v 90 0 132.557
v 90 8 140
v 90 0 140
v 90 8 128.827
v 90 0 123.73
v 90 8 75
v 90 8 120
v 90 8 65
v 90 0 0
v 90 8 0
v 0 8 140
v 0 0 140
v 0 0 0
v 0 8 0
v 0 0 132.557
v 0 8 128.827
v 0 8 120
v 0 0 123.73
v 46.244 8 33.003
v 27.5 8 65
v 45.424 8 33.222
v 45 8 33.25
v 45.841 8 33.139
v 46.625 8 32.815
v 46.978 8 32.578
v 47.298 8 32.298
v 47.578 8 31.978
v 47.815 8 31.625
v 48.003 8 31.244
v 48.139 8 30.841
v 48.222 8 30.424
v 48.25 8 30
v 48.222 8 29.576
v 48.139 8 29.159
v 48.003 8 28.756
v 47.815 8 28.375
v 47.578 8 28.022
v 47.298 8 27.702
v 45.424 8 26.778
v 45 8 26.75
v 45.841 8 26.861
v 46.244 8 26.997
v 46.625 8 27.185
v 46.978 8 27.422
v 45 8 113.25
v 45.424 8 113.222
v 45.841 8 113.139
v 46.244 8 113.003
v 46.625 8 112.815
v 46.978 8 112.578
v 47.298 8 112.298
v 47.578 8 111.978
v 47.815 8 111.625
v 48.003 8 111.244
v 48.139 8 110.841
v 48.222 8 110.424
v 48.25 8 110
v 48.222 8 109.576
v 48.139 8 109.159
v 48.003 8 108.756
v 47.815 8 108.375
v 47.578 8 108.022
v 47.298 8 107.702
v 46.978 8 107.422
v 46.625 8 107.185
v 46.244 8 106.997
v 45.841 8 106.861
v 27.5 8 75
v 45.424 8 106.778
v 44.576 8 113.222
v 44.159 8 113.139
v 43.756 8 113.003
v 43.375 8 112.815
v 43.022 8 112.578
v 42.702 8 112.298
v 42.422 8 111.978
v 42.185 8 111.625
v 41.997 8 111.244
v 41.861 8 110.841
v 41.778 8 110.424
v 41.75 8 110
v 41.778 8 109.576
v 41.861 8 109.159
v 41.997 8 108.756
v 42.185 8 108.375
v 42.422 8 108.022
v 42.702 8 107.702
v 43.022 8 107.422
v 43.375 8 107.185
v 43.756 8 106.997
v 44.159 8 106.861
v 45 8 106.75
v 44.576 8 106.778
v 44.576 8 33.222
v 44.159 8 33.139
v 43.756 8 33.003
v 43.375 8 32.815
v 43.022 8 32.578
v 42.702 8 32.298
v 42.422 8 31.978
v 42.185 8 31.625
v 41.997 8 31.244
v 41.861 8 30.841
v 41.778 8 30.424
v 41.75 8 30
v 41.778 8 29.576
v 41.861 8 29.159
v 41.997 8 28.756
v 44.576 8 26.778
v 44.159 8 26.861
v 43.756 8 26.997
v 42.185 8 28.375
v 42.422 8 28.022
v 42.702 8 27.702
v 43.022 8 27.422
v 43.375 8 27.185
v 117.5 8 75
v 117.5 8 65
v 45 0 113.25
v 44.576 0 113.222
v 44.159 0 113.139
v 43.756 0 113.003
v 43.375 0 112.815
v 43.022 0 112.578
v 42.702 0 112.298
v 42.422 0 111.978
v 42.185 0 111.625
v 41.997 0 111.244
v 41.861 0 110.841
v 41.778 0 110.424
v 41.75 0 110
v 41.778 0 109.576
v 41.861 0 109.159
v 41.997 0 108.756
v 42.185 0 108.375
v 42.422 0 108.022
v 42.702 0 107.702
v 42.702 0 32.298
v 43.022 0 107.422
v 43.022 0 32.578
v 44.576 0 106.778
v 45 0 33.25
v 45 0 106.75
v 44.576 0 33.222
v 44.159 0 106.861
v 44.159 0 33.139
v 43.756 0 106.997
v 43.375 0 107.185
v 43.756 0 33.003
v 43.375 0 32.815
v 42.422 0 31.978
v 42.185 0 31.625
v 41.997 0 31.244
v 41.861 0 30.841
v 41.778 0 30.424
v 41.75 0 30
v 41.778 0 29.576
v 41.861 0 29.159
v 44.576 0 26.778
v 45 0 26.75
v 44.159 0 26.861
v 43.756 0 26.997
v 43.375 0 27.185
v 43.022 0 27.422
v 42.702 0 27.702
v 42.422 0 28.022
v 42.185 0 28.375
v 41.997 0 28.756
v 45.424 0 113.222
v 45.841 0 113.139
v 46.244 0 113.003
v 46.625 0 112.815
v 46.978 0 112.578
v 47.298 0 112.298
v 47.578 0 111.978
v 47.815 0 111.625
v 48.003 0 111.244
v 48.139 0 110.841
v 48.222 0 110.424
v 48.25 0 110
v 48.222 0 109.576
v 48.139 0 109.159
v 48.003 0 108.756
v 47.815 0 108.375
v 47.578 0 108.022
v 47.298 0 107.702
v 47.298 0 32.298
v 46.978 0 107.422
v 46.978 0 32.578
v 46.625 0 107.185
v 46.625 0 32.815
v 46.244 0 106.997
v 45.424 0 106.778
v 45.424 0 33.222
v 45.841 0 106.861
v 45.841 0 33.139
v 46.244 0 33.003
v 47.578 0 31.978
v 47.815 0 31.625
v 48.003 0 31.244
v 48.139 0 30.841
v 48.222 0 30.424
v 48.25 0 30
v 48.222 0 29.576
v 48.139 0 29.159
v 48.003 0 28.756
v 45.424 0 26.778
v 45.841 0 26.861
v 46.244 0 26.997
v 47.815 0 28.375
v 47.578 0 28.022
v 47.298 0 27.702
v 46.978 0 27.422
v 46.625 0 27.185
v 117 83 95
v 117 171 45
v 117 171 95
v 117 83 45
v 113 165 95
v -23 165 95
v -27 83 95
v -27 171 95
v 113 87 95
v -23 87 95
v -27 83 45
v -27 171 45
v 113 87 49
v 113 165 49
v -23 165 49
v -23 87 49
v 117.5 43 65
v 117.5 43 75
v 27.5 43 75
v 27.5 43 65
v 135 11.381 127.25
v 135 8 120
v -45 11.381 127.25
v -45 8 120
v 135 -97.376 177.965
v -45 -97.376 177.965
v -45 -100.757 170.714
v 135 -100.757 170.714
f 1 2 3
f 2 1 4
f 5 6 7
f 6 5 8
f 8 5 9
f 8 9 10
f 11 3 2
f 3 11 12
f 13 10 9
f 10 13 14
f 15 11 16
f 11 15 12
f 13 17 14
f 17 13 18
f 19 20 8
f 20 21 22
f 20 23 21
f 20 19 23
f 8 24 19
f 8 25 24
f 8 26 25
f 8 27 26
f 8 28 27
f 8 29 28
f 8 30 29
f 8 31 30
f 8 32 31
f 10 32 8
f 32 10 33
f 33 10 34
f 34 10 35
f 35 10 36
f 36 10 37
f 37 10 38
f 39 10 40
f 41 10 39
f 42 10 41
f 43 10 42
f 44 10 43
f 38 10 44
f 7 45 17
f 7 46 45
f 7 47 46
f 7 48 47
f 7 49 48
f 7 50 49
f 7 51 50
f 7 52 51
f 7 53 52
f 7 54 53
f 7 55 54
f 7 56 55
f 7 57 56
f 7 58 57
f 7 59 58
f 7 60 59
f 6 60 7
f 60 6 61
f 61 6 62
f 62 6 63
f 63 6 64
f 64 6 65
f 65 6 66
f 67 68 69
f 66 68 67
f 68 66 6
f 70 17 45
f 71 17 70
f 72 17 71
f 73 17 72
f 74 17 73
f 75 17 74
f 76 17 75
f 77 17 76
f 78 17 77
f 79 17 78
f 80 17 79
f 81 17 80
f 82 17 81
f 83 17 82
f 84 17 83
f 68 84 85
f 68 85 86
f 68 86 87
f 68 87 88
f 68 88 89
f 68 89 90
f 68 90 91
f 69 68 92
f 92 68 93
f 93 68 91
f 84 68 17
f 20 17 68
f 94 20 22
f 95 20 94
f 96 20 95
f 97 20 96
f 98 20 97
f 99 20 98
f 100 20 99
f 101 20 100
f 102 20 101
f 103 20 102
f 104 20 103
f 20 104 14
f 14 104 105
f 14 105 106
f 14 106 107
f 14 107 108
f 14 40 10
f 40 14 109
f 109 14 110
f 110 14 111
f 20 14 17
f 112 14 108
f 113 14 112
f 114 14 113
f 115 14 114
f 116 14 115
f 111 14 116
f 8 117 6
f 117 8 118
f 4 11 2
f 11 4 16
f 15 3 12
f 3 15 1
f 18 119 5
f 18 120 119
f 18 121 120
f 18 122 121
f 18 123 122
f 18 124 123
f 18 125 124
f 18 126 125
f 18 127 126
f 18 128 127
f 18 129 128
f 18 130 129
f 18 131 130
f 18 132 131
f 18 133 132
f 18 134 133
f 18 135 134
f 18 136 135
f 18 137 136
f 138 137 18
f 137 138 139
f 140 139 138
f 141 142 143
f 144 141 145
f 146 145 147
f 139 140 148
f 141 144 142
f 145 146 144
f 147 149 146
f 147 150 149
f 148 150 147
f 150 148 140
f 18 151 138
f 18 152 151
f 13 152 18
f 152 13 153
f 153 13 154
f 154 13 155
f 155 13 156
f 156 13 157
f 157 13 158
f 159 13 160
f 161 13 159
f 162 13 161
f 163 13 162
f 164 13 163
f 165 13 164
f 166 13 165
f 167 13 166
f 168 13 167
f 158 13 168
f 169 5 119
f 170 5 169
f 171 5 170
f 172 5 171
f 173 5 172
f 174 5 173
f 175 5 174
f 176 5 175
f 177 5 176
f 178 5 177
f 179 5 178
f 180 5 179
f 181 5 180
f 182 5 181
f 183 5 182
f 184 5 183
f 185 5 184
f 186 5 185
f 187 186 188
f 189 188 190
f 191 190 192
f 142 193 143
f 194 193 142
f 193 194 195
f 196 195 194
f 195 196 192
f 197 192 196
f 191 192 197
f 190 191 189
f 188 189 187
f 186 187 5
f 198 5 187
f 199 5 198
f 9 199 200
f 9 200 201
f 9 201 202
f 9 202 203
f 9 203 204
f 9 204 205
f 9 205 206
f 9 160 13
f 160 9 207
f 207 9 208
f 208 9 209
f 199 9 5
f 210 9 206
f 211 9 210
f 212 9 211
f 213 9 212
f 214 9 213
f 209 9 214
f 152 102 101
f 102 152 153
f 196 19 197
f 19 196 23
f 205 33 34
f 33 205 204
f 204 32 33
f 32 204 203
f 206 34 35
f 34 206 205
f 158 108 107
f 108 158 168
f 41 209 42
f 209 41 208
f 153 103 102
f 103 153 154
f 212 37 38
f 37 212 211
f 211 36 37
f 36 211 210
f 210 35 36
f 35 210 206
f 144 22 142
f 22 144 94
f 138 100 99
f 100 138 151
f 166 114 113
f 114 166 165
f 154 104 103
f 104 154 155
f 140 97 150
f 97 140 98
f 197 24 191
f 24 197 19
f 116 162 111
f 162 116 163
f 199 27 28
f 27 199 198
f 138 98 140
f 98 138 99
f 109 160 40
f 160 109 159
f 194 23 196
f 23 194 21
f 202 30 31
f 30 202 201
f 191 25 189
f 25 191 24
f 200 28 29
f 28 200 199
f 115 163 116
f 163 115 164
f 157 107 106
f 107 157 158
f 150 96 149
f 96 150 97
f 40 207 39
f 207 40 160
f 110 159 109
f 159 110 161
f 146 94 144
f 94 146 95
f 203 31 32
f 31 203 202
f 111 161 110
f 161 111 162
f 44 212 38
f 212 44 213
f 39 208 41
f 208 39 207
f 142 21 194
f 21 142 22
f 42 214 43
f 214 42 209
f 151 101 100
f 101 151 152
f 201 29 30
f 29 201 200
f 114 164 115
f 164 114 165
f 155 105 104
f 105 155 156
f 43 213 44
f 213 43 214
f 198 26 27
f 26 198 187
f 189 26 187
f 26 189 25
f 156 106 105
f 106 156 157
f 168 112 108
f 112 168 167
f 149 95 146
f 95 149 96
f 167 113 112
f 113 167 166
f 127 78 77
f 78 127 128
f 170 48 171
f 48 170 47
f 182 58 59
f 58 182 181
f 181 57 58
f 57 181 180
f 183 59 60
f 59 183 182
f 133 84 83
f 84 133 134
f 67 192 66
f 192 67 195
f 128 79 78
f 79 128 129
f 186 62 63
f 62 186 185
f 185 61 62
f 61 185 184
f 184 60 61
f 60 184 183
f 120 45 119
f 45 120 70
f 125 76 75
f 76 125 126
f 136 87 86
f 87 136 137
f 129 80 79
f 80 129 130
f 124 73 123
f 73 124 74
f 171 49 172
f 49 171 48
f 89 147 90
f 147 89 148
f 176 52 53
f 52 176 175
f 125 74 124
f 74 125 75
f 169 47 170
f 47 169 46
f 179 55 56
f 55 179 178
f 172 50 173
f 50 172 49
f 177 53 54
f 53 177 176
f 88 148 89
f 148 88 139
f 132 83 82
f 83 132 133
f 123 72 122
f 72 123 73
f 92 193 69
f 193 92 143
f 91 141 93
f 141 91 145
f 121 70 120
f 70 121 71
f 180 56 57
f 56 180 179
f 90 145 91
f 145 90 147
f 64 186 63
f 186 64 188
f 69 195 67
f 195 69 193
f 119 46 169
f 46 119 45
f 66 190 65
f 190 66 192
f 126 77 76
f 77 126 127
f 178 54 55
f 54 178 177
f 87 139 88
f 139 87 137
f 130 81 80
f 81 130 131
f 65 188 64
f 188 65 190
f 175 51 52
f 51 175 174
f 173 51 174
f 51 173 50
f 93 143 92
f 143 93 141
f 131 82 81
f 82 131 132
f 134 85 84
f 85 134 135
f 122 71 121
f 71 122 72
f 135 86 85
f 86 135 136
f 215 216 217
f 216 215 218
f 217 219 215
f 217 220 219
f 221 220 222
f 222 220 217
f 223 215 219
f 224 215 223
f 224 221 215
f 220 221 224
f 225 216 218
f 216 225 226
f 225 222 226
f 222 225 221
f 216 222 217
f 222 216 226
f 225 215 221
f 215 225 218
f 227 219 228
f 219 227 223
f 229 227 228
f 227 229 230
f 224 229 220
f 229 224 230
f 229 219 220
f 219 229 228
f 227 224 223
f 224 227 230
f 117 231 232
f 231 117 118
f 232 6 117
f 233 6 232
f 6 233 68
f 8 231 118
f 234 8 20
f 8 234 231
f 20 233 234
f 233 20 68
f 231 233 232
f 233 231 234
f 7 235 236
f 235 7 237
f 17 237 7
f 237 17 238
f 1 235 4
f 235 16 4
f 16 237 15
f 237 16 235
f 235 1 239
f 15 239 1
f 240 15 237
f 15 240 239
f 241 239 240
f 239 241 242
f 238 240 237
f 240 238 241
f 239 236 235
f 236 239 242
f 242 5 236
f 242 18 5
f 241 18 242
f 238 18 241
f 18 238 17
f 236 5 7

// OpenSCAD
// ============================================================
// Improved Argus 4 Pro Mount + Rain Hood + Solar Panel Bracket
// Parametric - open in OpenSCAD, adjust, export STL
// ============================================================

/* [Camera] */
camera_width = 128;
camera_depth = 80;
cradle_clearance = 4;

/* [Mount] */
arm_length = 90;
wall_plate_w = 90;
wall_plate_h = 140;

/* [Solar Bracket] */
solar_bracket = true;
solar_panel_width = 180;   // approx Reolink Solar Panel 2
solar_tilt = 65;           // degrees - steep for Estonia winter

/* [Hidden] */
$fn = 48;
wt = 4; // wall thickness

module wall_plate() {
    difference() {
        cube([wall_plate_w, 8, wall_plate_h]);
        translate([wall_plate_w/2, -1, 30])
            rotate([-90,0,0]) cylinder(h=10, d=6.5);
        translate([wall_plate_w/2, -1, wall_plate_h-30])
            rotate([-90,0,0]) cylinder(h=10, d=6.5);
    }
}

module arm() {
    cube([arm_length, 35, 10]);
}

module cradle() {
    outer_w = camera_width + 2*cradle_clearance + 2*wt;
    outer_d = camera_depth + cradle_clearance + wt;
    difference() {
        cube([outer_w, outer_d, 50]);
        translate([wt, wt, wt])
            cube([outer_w-2*wt, outer_d-wt-6, 55]);
    }
    // front lip
    translate([0, outer_d-6, 0])
        cube([outer_w, 6, wt]);
}

module solar_bracket() {
    if (solar_bracket) {
        // Simple angled plate for solar panel
        rotate([solar_tilt, 0, 0])
            cube([solar_panel_width, 8, 120]);
    }
}

// Assembly
wall_plate();

translate([(wall_plate_w-35)/2, 8, (wall_plate_h-10)/2])
    arm();

translate([(wall_plate_w - (camera_width+2*cradle_clearance+2*wt))/2,
           8+arm_length-15,
           (wall_plate_h-50)/2])
    cradle();

// Solar bracket mounted above/behind
translate([wall_plate_w/2 - solar_panel_width/2, 8, wall_plate_h - 20])
    solar_bracket();
